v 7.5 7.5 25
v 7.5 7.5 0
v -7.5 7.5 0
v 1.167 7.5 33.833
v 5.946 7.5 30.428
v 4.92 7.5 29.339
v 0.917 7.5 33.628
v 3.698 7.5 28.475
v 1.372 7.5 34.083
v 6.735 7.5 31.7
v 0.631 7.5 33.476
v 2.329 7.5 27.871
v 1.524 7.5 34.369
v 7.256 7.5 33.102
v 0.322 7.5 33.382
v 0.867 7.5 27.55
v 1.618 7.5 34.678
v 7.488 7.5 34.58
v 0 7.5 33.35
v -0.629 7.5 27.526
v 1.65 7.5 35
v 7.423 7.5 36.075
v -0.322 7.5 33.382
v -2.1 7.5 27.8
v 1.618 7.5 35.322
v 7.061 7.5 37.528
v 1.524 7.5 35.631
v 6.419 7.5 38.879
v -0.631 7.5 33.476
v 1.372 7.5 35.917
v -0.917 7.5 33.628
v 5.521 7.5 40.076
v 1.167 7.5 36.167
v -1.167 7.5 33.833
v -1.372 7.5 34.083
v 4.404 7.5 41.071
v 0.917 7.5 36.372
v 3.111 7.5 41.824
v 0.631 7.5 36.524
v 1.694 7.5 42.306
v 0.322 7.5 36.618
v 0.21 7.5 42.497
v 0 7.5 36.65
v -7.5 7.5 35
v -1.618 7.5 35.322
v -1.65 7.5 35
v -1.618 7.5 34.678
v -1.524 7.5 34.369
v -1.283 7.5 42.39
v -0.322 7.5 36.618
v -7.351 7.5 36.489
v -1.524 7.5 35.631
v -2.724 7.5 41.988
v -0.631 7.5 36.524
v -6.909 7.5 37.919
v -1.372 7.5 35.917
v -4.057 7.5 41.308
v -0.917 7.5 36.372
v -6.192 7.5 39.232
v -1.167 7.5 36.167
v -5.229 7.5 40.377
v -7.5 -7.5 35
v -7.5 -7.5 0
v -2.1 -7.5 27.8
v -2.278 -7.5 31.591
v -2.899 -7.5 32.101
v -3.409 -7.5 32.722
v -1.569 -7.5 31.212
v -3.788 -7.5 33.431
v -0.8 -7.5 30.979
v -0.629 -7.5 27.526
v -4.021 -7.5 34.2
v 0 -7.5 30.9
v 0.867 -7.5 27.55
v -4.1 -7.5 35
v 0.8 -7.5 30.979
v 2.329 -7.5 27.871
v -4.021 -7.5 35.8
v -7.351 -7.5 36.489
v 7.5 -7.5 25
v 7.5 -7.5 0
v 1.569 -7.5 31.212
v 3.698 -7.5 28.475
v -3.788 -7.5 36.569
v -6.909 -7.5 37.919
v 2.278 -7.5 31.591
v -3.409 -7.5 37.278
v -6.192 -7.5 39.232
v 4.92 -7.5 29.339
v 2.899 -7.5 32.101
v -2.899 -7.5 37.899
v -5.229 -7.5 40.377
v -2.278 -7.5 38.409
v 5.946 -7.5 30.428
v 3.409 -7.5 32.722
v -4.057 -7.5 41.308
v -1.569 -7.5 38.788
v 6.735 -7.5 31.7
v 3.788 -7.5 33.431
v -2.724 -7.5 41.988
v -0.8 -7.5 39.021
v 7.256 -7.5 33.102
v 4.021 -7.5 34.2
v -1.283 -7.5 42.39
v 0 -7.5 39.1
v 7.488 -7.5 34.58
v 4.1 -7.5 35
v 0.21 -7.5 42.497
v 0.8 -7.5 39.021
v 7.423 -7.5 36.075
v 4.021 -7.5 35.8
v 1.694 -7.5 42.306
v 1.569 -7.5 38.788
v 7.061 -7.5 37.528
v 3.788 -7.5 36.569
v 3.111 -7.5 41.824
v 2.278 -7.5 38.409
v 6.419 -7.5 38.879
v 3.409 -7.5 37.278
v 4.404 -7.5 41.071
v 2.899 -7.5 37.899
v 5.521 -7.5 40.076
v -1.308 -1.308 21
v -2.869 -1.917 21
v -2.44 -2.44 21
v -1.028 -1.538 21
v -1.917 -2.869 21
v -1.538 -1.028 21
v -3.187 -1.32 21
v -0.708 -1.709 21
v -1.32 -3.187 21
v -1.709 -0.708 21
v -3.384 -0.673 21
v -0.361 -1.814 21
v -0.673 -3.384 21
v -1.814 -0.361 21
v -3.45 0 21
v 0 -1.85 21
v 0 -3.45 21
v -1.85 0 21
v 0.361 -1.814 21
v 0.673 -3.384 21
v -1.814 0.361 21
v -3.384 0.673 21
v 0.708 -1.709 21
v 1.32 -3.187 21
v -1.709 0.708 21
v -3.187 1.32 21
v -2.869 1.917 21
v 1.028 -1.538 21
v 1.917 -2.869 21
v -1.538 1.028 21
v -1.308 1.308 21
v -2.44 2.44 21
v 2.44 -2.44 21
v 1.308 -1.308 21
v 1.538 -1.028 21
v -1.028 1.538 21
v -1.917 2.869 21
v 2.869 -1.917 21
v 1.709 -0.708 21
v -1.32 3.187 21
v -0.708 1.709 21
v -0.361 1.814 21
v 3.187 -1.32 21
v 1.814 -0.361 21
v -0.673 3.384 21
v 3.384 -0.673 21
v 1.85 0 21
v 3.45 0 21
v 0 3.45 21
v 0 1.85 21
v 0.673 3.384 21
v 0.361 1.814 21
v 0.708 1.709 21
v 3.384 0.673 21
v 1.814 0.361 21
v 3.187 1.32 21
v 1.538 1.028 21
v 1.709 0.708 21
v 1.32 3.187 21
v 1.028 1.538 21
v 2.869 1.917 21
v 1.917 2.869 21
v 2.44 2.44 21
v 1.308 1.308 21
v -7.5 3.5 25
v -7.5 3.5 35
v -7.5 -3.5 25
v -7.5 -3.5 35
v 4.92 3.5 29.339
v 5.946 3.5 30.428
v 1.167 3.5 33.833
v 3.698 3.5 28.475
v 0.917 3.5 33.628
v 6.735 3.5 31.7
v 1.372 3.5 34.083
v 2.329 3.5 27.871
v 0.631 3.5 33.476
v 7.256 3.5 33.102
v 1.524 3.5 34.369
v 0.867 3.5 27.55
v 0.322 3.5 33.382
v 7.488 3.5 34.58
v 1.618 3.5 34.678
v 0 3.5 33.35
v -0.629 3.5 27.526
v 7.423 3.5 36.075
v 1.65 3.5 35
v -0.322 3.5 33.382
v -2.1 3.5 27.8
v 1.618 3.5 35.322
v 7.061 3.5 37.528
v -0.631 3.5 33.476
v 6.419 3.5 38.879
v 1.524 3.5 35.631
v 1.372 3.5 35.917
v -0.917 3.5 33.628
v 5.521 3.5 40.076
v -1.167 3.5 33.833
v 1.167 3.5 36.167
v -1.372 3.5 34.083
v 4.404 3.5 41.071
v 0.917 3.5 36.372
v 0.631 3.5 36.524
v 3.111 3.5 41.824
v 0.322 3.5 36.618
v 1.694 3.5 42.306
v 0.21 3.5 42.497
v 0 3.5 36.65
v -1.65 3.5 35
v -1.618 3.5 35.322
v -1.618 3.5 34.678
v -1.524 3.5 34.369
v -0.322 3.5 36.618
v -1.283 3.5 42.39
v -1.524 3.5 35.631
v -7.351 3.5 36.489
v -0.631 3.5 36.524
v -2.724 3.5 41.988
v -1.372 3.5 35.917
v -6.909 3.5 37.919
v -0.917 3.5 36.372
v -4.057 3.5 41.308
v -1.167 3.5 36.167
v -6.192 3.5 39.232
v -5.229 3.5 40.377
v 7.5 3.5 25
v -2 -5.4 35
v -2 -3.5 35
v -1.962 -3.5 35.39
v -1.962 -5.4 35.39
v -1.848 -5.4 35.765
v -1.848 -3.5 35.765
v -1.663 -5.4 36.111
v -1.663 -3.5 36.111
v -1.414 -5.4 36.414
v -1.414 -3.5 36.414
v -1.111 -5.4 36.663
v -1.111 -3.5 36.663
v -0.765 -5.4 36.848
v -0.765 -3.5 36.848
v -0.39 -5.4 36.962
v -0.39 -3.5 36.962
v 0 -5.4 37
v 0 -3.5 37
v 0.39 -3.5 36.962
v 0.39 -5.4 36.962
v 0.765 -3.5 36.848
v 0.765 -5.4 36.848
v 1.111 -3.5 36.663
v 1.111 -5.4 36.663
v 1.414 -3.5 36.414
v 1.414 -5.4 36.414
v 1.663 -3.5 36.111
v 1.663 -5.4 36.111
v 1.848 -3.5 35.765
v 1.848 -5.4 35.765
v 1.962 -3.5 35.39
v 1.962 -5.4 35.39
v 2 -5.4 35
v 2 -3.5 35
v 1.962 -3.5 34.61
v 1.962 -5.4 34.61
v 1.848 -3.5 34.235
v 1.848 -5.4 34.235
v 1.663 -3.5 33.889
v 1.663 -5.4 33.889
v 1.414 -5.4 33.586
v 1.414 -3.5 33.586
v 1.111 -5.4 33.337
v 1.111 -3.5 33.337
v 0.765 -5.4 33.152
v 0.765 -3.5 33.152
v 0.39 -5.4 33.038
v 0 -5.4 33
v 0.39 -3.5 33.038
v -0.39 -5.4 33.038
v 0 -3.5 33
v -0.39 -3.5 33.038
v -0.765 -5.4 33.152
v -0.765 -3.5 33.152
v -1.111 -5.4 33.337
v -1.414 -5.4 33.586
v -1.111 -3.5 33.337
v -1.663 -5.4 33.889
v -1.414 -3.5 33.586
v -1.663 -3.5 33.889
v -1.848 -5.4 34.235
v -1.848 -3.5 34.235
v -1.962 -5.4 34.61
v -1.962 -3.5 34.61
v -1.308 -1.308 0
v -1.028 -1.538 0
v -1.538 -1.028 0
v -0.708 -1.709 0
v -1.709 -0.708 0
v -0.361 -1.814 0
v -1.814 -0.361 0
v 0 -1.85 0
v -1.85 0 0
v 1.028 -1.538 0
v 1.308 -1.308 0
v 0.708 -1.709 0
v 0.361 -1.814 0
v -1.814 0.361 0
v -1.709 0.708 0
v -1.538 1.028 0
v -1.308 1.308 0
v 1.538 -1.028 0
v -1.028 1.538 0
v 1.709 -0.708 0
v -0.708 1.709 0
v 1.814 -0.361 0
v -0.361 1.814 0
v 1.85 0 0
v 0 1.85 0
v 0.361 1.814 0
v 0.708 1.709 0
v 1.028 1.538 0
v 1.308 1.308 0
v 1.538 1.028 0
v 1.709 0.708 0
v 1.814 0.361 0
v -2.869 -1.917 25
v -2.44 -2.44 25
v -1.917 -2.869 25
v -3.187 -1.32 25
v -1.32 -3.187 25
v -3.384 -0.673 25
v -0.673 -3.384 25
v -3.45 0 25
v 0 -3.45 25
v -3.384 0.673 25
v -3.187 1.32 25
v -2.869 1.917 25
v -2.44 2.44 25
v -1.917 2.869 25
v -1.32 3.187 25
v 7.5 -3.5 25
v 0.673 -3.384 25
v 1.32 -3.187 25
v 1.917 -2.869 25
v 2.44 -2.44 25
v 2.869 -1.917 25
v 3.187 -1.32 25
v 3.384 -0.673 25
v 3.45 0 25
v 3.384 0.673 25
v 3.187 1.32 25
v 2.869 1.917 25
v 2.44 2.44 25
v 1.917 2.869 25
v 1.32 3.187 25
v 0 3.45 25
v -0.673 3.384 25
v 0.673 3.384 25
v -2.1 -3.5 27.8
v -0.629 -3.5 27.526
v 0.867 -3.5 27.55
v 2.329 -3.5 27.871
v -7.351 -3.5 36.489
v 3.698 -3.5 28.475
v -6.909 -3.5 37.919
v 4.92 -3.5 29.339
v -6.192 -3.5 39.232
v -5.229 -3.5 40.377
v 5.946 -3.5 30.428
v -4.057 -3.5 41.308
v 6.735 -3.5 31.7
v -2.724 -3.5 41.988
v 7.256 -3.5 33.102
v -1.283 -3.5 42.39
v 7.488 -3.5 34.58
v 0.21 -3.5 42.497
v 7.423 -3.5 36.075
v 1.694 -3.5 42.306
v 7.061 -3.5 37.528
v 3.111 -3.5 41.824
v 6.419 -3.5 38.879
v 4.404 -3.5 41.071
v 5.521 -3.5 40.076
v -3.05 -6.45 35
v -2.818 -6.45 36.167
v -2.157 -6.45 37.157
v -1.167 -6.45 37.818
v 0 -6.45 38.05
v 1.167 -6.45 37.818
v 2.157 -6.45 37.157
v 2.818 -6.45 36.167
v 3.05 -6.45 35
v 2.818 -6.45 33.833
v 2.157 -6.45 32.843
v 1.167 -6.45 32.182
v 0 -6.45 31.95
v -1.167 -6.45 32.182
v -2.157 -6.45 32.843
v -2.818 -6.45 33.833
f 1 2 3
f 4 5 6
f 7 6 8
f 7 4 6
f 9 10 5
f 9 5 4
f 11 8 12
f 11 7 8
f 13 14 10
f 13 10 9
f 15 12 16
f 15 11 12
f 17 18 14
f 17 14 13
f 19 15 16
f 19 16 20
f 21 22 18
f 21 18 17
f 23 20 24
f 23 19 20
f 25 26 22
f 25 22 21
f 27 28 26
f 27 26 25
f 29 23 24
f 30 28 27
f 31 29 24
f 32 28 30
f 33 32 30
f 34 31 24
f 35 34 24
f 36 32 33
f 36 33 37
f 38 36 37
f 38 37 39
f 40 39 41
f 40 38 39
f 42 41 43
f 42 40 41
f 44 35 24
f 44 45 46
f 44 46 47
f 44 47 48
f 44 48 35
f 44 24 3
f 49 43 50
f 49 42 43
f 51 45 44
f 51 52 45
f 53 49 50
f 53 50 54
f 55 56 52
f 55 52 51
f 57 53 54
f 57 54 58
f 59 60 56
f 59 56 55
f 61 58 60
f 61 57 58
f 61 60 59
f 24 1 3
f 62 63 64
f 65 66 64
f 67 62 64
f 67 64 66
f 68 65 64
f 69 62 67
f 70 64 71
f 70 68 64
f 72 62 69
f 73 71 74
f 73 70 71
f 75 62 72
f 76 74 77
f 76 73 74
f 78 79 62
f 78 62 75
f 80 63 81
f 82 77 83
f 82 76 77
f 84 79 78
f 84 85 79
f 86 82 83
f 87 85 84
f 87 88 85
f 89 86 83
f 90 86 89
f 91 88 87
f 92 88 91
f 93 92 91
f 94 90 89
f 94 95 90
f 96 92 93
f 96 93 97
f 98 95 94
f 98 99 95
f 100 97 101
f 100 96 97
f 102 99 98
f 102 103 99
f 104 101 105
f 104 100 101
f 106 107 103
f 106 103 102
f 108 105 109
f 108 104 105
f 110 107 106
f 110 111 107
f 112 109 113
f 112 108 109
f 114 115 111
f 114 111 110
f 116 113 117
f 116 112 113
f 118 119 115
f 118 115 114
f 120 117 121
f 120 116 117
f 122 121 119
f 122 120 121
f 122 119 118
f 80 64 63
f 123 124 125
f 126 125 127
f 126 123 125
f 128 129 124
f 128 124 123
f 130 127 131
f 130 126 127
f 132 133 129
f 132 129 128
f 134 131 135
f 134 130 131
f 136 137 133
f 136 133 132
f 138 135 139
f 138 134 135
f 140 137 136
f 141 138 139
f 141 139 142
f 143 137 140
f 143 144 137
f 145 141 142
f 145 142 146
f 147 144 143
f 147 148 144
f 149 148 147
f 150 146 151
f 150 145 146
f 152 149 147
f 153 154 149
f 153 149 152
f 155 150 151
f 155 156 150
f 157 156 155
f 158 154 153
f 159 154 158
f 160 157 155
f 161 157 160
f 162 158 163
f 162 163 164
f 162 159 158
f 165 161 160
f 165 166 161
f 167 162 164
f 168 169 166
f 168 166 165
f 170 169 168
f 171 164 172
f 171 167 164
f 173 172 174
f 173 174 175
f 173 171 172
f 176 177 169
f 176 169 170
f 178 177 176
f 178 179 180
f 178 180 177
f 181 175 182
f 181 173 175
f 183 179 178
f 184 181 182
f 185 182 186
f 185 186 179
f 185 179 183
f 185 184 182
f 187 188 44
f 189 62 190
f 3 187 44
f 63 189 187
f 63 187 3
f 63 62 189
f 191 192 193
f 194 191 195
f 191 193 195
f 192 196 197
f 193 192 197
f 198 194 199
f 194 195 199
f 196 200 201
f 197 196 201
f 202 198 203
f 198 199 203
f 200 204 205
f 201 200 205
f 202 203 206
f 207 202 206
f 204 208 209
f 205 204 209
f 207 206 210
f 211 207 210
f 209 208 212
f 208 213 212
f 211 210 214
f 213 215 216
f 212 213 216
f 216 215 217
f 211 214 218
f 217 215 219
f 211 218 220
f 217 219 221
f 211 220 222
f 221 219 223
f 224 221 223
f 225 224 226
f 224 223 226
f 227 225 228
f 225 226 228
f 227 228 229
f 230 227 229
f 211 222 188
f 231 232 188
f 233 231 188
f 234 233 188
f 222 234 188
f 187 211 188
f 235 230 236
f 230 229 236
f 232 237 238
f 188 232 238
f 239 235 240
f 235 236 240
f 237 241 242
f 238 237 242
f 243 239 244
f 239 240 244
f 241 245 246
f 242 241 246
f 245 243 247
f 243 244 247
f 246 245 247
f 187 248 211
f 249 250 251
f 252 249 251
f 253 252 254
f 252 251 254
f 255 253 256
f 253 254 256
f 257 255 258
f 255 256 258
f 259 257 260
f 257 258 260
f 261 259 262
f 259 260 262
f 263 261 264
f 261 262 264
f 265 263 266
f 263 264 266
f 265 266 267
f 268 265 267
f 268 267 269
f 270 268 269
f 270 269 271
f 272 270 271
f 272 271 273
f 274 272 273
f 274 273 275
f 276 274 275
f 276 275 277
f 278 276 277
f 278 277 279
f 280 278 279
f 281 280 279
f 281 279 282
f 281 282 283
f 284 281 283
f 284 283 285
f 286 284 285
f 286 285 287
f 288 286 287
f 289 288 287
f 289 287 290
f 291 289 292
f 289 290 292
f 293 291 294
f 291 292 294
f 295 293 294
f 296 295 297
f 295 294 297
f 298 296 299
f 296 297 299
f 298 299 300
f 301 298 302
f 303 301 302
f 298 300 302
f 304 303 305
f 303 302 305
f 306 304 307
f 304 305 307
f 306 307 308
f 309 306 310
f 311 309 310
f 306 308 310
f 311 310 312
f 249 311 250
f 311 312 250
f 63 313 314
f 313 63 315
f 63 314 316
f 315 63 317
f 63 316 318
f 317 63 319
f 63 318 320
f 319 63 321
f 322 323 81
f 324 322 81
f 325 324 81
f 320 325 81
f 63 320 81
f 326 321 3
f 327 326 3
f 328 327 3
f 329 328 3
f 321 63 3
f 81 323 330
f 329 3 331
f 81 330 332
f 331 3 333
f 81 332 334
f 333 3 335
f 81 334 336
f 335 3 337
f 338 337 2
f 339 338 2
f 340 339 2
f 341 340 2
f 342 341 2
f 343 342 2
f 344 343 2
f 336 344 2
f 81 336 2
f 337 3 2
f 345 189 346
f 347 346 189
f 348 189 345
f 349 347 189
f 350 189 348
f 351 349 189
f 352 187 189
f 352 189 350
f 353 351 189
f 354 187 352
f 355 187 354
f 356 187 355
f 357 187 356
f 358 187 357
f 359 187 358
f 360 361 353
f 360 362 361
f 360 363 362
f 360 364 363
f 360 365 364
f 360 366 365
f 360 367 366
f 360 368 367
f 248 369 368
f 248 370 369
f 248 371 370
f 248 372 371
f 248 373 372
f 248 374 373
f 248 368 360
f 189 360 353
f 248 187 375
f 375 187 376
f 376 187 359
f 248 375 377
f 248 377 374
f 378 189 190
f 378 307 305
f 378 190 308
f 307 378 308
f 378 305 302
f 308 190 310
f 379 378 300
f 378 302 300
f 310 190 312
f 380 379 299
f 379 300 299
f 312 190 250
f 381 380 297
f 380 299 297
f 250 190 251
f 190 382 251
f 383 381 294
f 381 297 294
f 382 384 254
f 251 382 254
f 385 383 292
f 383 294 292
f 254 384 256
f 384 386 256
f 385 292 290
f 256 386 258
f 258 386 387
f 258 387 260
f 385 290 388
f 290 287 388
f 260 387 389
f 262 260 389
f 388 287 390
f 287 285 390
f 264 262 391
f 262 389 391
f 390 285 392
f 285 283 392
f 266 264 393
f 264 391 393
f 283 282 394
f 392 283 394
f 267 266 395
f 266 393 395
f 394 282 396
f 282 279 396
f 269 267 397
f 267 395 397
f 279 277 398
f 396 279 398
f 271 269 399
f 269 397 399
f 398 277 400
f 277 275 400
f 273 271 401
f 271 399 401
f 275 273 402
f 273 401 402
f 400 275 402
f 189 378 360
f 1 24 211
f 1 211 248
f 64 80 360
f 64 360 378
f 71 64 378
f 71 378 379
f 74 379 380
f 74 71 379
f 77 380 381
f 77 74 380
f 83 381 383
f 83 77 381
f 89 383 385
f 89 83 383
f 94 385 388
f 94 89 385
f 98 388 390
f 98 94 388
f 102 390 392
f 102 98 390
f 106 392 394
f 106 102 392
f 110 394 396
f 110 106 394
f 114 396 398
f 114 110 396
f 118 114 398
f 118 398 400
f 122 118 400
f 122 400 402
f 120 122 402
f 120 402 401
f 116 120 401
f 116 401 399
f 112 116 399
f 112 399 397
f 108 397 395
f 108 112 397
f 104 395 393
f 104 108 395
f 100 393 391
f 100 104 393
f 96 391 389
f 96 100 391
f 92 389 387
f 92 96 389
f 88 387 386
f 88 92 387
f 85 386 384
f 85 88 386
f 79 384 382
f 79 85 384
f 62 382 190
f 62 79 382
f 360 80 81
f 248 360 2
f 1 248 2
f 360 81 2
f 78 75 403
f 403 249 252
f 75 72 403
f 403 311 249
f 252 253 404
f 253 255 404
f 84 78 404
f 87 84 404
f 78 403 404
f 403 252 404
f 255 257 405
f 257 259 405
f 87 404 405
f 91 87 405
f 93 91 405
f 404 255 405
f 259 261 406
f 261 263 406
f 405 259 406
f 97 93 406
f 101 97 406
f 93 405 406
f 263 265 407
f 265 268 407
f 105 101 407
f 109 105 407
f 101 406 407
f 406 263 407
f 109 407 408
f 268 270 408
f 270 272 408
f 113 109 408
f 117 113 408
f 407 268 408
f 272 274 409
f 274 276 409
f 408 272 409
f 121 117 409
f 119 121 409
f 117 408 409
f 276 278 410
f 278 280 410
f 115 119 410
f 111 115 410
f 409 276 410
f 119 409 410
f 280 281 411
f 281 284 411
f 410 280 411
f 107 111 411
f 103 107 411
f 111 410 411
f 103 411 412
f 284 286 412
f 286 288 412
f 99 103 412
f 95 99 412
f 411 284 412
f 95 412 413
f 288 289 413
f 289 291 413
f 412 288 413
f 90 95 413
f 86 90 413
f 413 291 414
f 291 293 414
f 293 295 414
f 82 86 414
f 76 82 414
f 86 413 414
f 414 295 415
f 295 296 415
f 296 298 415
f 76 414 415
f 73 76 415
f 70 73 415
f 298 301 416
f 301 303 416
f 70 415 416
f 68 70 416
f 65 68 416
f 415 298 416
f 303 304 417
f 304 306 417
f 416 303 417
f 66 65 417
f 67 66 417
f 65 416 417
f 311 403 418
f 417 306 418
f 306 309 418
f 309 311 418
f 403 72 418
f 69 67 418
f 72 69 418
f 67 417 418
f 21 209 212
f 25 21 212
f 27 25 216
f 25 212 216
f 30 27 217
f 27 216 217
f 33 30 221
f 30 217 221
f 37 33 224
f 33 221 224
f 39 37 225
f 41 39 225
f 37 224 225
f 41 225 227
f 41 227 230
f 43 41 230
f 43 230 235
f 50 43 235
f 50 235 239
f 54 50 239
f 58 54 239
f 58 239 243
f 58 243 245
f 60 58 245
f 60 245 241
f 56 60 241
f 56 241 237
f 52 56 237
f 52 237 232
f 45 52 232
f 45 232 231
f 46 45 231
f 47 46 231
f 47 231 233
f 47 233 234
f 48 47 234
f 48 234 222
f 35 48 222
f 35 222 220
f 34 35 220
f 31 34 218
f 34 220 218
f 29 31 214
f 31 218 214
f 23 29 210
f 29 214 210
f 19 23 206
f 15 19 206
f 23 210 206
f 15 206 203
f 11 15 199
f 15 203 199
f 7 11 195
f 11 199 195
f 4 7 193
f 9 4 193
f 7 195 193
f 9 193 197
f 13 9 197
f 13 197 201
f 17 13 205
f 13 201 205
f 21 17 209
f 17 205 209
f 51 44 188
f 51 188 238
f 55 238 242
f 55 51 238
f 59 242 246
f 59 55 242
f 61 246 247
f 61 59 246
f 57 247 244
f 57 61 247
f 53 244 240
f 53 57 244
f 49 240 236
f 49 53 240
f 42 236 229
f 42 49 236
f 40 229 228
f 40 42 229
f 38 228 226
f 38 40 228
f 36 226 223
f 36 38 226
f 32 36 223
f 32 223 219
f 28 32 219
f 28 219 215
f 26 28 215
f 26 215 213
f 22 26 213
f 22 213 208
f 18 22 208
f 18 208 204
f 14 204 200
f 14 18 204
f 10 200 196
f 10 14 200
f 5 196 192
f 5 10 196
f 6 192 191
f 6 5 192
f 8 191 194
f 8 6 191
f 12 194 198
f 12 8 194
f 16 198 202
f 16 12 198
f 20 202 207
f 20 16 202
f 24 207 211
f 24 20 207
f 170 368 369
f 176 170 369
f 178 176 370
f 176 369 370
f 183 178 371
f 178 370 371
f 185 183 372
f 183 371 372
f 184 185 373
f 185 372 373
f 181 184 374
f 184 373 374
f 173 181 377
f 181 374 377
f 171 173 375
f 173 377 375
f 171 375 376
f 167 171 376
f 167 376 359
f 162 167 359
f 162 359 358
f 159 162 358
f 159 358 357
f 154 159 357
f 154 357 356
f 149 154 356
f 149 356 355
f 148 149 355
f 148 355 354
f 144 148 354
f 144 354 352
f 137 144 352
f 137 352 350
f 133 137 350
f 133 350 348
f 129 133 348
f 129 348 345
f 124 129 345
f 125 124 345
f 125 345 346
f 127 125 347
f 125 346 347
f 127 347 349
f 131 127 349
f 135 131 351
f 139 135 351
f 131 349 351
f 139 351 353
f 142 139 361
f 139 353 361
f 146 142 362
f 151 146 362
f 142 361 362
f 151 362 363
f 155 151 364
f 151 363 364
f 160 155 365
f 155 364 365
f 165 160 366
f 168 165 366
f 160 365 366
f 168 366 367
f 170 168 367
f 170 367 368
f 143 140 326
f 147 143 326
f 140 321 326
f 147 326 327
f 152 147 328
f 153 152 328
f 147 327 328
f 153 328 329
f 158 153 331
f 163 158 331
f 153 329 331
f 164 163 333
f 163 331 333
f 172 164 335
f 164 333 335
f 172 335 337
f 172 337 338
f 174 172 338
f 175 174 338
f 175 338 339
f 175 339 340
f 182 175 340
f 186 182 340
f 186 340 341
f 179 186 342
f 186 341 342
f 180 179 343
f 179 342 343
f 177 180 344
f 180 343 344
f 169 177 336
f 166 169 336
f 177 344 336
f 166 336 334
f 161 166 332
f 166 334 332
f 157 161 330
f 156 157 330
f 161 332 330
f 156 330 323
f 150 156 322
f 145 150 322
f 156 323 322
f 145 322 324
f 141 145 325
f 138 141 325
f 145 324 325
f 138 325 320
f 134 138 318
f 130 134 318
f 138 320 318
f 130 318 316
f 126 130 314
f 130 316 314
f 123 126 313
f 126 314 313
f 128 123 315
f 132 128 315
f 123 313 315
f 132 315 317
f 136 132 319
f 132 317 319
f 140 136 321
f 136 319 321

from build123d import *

# Parameters (mm, degrees)
F1_DEPTH       = 25
F3_D           = 3.7
F3_CBORE_D     = 6.9
F3_CBORE_DEPTH = 4
F5_DEPTH       = 4
F7_DEPTH       = 4
F9_D           = 4
F9_DEPTH       = 4
F9_CSINK_D     = 8.2
F9_CSINK_ANGLE = 90
F11_D          = 3.3
F11_DEPTH      = 4


with BuildPart() as f1:
    # F0 (on Top) → F1 (new body)
    with BuildSketch(Plane.XY):
        Polygon((7.5, -7.5), (7.5, 0), (7.5, 7.5), (-7.5, 7.5), (-7.5, -7.5), align=None)
    extrude(amount=F1_DEPTH)

    # F3 (through all)
    with Locations(Plane.XY.offset(25)):
        with Locations((0, 0)):
            CounterBoreHole(F3_D / 2, F3_CBORE_D / 2, F3_CBORE_DEPTH)

    # F4 (on face) → F5 (join)
    with BuildSketch(Plane(origin=(0, 7.5, 0), x_dir=(-1, 0, 0), z_dir=(0, 1, 0))):
        with BuildLine():
            Line((-7.5, 25), (7.5, 25))
            Line((7.5, 25), (7.5, 35))
            ThreePointArc((7.5, 35), (6, 30.5), (2.1, 27.8))
            Line((2.1, 27.8), (-7.5, 25))
        make_face()
        with BuildLine():
            ThreePointArc((2.1, 27.8), (6, 30.5), (7.5, 35))
            ThreePointArc((7.5, 35), (-6, 39.5), (2.1, 27.8))
        make_face()
    extrude(amount=-F5_DEPTH)

    # F6 (on face) → F7 (join)
    with BuildSketch(Plane.XZ.offset(7.5)):
        with BuildLine():
            ThreePointArc((7.5, 35), (0, 42.5), (-7.5, 35))
            ThreePointArc((-7.5, 35), (-6, 30.5), (-2.1, 27.8))
            ThreePointArc((-2.1, 27.8), (4.5, 29), (7.5, 35))
        make_face()
        with BuildLine():
            Line((-7.5, 35), (-7.5, 25))
            Line((-7.5, 25), (7.5, 25))
            Line((7.5, 25), (-2.1, 27.8))
            ThreePointArc((-2.1, 27.8), (-6, 30.5), (-7.5, 35))
        make_face()
    extrude(amount=-F7_DEPTH)

    # F9
    with Locations(Plane.XZ.offset(7.5)):
        with Locations((0, 35)):
            CounterSinkHole(F9_D / 2, F9_CSINK_D / 2, depth=F9_DEPTH, counter_sink_angle=F9_CSINK_ANGLE)

    # F11
    with Locations(Plane(origin=(0, 7.5, 0), x_dir=(-1, 0, 0), z_dir=(0, 1, 0))):
        with Locations((0, 35)):
            Hole(F11_D / 2, depth=F11_DEPTH)


solid = f1.part
